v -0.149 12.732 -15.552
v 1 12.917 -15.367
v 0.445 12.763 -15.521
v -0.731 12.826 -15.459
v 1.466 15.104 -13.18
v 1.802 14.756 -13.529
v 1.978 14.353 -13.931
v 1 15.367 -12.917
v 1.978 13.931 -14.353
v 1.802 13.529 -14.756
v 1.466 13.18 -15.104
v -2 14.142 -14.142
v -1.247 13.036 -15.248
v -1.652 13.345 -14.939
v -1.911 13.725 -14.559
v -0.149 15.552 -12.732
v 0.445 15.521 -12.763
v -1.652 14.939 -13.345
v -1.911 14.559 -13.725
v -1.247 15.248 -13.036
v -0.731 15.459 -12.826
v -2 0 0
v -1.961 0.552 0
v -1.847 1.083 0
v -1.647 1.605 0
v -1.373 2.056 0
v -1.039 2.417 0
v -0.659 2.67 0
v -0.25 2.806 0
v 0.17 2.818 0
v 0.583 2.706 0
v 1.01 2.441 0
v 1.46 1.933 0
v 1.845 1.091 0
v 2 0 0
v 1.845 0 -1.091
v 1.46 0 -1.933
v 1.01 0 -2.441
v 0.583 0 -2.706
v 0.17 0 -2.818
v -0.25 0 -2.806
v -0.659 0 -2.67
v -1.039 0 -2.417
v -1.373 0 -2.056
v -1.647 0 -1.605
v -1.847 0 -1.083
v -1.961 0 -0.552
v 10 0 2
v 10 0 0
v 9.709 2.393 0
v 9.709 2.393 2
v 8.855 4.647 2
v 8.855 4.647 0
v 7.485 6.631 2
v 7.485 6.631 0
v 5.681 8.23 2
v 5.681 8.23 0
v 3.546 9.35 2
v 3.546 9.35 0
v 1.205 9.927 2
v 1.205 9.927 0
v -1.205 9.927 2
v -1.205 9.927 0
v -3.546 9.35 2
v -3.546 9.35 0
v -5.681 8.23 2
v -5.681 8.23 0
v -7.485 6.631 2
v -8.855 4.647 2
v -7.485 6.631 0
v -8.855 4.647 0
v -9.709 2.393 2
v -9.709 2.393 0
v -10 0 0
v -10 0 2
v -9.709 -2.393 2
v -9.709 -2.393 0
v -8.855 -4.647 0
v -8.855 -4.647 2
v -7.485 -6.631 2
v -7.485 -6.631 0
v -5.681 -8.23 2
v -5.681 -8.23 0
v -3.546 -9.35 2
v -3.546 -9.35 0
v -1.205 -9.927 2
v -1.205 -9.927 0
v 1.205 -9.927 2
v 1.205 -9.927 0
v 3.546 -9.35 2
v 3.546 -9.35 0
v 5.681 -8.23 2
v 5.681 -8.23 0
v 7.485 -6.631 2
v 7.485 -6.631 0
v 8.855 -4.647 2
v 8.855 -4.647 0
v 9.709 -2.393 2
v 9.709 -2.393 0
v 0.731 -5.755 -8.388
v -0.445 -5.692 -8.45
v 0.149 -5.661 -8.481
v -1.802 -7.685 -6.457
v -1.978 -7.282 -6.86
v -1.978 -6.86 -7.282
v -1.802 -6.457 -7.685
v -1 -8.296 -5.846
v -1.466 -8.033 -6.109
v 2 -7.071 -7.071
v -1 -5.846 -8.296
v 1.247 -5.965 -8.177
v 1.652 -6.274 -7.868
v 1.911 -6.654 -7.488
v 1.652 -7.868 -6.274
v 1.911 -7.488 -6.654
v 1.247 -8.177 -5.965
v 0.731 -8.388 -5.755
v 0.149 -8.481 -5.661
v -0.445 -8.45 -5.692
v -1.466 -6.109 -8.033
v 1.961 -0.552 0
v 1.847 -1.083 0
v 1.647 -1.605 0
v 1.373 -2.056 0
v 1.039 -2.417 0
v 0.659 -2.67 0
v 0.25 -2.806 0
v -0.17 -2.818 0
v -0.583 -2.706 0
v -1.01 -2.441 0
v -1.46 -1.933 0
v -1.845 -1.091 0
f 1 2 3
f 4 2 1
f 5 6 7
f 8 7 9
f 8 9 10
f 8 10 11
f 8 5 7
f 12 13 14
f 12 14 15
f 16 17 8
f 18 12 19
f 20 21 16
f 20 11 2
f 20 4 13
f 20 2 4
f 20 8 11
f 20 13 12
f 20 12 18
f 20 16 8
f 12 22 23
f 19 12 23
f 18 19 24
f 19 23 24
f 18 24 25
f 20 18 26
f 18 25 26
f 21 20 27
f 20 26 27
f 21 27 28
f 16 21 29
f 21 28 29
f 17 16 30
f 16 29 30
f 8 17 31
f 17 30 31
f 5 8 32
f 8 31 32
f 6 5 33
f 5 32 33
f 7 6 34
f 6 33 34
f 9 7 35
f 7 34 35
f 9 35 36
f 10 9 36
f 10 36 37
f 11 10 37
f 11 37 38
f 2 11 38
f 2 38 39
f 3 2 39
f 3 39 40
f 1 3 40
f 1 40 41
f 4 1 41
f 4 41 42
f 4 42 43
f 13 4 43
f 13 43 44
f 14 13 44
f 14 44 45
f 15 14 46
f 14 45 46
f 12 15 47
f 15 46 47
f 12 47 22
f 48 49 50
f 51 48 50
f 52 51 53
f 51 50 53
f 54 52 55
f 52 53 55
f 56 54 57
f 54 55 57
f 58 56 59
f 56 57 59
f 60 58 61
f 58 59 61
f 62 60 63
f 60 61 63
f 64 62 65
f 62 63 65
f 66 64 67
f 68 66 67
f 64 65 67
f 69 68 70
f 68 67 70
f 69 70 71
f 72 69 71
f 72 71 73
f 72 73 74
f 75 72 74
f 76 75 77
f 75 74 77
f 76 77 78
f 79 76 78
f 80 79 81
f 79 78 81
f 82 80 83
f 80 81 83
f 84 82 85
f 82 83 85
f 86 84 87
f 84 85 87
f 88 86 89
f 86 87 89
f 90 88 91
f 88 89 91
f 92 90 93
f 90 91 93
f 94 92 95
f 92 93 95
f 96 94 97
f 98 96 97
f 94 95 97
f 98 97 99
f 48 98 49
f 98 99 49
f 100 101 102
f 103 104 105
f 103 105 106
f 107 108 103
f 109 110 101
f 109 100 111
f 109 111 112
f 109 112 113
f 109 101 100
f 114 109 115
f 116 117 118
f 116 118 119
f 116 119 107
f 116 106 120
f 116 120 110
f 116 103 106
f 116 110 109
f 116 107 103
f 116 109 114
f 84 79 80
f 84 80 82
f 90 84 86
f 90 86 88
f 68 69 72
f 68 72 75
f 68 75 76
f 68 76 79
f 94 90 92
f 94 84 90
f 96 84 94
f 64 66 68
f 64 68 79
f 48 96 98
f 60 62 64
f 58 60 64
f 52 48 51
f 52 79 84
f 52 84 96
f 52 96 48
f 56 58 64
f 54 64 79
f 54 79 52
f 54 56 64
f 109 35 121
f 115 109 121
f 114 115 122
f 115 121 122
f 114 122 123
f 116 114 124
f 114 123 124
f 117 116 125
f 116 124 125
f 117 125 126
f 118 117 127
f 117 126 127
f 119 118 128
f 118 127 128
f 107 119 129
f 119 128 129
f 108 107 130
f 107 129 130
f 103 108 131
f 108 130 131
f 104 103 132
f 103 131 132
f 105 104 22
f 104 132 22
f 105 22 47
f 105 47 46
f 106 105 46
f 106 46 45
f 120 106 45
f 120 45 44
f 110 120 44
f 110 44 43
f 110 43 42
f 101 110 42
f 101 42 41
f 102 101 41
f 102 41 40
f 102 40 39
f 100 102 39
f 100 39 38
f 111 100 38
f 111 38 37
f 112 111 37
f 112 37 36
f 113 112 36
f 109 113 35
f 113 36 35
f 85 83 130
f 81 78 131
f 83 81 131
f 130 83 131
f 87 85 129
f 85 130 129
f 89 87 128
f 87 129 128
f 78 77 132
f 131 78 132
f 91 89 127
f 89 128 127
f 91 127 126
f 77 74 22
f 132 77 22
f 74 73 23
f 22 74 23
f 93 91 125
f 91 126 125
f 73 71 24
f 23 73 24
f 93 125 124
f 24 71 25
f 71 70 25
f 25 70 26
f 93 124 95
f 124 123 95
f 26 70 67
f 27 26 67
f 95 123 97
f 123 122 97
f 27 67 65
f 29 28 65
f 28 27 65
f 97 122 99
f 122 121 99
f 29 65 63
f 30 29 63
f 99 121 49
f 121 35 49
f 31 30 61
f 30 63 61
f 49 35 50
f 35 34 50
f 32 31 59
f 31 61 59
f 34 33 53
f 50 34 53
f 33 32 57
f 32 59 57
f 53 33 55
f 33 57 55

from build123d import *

# Parameters (mm, degrees)
SKETCH1_R           = 10
BOSS_EXTRUDE1_DEPTH = 2
SKETCH3_R           = 2
BOSS_EXTRUDE2_DEPTH = 10
SKETCH4_R           = 2
BOSS_EXTRUDE3_DEPTH = 20


with BuildPart() as part:
    # Sketch1 → Boss-Extrude1 (new body)
    with BuildSketch(Plane.XY):
        Circle(SKETCH1_R)
    extrude(amount=BOSS_EXTRUDE1_DEPTH)

    # Sketch3 → Boss-Extrude2 (add)
    with BuildSketch(Plane(origin=(0, 0, 0), x_dir=(-1, 0, 0), z_dir=(0, -0.7071067811865476, -0.7071067811865476))):
        with Locations(Location((0, 0, 0), (0, 0, 180))):
            Circle(SKETCH3_R)
    extrude(amount=BOSS_EXTRUDE2_DEPTH)

    # Sketch4 → Boss-Extrude3 (add)
    with BuildSketch(Plane(origin=(0, 0, 0), x_dir=(-1, 0, 0), z_dir=(0, 0.7071067811865477, -0.7071067811865475))):
        Circle(SKETCH4_R)
    extrude(amount=BOSS_EXTRUDE3_DEPTH)


solid = part.part
